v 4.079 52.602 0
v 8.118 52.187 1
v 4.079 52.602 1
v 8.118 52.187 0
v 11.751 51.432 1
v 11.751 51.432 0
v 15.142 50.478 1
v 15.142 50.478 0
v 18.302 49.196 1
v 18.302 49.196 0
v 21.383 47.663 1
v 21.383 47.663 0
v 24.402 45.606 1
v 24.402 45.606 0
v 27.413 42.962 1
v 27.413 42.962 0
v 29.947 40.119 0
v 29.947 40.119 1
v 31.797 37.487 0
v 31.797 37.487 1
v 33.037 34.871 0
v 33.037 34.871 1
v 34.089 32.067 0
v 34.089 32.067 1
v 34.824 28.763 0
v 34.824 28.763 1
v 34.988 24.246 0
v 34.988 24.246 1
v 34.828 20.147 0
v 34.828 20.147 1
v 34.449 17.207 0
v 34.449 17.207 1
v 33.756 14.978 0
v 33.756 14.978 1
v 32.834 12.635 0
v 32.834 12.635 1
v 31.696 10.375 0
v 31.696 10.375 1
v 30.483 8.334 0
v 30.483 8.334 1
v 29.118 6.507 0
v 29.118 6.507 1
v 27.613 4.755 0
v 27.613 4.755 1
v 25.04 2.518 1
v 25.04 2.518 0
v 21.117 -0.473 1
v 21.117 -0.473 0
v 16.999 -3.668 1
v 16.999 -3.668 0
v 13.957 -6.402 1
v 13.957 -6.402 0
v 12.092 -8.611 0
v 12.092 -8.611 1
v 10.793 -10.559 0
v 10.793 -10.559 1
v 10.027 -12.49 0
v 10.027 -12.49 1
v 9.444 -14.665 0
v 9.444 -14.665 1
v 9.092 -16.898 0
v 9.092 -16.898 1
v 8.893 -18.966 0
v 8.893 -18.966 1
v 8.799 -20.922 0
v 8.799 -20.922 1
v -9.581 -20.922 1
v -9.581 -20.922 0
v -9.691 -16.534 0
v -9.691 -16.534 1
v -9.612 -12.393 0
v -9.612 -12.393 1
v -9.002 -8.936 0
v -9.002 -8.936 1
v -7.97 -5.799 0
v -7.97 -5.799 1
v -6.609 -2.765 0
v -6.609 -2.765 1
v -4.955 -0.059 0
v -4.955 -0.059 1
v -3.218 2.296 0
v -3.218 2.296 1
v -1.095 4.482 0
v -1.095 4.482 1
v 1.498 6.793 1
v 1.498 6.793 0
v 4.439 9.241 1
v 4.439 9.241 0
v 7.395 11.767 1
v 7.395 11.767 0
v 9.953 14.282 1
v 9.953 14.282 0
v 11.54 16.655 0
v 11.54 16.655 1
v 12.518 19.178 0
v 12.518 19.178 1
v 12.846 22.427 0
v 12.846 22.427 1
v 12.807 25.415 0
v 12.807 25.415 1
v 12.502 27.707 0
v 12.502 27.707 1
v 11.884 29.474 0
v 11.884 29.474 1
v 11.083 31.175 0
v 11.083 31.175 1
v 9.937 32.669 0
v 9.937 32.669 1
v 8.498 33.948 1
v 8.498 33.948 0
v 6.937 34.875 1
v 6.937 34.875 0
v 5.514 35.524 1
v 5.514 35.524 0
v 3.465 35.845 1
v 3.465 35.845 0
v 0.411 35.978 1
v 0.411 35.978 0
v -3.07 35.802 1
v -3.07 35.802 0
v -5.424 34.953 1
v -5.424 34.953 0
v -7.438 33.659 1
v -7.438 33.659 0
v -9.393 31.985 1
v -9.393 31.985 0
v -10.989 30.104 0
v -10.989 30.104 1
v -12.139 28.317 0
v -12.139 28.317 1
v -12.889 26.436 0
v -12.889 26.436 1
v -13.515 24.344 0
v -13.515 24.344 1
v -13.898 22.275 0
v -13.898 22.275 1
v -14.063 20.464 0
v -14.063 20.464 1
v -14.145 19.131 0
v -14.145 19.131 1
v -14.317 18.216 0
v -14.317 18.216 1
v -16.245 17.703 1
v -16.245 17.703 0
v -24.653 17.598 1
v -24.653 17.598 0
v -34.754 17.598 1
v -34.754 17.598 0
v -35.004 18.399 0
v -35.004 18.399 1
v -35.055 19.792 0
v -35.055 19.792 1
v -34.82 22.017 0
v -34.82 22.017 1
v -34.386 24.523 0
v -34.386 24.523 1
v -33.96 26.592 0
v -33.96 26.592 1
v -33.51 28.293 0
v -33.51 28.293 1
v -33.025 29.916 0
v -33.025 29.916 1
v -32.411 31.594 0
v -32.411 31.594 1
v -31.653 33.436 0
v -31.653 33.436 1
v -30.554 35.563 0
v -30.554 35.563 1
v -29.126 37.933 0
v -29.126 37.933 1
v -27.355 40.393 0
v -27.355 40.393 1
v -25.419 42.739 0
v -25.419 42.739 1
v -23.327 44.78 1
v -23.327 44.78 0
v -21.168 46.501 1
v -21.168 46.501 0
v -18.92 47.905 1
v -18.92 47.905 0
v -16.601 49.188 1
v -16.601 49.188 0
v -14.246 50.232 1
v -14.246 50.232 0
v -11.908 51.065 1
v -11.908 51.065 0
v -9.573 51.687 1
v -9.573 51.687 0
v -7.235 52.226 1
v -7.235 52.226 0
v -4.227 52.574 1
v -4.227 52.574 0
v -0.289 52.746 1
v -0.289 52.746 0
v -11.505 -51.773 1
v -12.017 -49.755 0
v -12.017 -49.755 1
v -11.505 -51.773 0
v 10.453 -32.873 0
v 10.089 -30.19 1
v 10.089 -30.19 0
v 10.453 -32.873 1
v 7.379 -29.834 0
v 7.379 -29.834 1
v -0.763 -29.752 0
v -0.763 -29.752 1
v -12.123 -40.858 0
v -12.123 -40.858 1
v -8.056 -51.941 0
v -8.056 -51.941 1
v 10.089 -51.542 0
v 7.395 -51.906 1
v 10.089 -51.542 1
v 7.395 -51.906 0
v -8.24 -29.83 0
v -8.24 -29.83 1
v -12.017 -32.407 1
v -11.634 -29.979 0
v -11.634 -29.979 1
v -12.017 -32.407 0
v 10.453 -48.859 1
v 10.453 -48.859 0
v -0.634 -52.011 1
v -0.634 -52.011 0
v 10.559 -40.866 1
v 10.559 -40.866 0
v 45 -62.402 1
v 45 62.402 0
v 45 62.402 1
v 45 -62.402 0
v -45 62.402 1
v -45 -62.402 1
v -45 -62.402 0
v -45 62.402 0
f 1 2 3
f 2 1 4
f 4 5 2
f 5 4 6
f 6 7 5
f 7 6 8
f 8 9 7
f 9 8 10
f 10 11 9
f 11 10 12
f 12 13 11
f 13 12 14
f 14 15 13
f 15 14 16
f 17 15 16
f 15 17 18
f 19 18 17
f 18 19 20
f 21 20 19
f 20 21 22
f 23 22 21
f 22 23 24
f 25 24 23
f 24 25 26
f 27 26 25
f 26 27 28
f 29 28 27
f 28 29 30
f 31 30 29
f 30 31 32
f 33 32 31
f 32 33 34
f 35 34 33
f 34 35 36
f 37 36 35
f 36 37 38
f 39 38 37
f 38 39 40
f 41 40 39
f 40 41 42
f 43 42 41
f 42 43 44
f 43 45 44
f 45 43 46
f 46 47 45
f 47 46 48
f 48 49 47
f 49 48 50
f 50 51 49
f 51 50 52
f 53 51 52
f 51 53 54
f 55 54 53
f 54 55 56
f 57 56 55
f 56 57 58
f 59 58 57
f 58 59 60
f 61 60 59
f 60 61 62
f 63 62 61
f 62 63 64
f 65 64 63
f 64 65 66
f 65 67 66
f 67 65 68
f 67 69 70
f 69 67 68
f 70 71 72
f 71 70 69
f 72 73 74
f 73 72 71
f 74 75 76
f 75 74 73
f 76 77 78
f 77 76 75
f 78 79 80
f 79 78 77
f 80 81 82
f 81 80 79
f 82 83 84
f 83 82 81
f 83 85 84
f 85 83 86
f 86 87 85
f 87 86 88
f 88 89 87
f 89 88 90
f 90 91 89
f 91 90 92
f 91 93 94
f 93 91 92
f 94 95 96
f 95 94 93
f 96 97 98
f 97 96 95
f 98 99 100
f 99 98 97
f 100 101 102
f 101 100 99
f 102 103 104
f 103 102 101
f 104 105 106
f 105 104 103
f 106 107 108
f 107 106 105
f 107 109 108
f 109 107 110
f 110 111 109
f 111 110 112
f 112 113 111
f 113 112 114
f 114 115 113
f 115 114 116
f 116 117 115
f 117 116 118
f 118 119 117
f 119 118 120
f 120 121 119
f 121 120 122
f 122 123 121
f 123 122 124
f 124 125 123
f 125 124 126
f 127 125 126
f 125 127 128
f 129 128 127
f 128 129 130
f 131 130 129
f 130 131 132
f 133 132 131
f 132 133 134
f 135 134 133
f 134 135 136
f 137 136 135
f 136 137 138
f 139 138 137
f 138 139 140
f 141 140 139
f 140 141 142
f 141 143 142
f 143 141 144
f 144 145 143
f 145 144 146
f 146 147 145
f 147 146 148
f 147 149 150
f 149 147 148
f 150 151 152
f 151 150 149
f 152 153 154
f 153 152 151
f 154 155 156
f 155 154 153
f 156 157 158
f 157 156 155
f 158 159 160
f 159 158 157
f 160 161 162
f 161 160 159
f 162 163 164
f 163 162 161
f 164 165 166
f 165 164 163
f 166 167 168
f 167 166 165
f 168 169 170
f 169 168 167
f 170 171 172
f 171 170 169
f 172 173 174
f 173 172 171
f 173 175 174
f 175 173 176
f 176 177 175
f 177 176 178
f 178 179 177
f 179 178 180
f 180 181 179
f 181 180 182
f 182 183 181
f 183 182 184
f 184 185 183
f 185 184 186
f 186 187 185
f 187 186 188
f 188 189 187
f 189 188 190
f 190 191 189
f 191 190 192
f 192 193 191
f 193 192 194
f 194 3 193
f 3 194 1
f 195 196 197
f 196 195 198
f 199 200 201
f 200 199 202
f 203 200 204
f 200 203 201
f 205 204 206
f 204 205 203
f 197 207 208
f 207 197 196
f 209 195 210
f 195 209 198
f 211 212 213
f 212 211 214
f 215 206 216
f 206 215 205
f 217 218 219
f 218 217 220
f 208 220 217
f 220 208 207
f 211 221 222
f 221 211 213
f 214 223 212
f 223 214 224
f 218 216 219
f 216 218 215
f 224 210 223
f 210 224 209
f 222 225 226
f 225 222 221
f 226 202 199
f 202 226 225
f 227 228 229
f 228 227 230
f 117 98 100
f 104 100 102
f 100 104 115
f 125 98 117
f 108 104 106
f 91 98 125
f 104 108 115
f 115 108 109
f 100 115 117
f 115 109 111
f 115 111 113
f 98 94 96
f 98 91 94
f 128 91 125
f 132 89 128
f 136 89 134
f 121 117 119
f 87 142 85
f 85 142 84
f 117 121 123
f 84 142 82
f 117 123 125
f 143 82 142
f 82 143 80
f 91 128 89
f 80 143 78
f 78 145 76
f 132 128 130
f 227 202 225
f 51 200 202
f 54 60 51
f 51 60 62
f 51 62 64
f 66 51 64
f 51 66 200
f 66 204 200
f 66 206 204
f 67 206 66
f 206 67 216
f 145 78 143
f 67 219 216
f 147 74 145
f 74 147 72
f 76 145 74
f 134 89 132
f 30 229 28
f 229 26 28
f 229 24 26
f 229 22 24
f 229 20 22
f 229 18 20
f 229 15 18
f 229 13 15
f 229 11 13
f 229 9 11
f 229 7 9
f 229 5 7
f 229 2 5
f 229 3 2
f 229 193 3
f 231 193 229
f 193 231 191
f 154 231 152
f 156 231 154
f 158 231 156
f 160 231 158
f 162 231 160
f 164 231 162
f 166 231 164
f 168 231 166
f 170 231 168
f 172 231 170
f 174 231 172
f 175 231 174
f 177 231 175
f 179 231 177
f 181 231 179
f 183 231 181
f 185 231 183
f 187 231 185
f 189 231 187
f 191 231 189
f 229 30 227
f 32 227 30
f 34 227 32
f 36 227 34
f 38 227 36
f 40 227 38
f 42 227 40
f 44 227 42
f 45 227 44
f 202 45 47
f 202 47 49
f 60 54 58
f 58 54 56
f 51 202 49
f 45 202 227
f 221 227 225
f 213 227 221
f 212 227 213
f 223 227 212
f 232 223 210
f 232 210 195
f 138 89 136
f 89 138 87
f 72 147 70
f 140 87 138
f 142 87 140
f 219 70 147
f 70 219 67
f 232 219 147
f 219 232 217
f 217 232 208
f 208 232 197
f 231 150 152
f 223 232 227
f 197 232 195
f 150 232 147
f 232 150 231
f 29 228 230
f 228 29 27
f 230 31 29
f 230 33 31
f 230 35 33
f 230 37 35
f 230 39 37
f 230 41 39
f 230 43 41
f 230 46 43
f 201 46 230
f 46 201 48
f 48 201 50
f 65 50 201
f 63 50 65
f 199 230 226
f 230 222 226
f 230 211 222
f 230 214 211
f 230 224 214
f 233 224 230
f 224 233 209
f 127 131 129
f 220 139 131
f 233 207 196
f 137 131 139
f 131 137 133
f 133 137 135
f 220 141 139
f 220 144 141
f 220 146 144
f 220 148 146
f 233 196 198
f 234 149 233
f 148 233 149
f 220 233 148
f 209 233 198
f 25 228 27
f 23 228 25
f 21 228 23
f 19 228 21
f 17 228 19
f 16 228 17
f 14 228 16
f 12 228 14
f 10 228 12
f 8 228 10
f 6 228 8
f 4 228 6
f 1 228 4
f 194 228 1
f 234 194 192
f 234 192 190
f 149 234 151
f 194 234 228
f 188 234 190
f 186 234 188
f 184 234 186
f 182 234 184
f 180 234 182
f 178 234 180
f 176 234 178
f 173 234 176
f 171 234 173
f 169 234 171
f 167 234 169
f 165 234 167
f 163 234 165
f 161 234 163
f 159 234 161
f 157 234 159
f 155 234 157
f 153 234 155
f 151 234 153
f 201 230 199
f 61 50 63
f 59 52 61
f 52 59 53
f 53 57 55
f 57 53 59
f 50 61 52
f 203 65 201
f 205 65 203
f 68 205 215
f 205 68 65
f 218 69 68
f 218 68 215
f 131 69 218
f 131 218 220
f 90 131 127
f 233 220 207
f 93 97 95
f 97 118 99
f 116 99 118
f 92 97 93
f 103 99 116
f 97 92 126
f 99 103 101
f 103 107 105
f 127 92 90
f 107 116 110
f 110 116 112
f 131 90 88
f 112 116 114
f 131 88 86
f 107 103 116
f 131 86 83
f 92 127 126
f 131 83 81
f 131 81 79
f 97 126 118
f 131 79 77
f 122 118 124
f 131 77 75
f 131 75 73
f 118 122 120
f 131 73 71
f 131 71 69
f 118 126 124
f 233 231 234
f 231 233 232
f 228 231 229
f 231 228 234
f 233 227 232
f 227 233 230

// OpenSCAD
//------------------------------------------------------------
//	Stencil-o-Matic
//
//	input comes from:
//	http://chaaawa.com/stencil_factory/
//   or
//   http://chaaawa.com/stencil_factory_js/
//
//	http://thingiverse.com/Benjamin
//	http://www.thingiverse.com/thing:55821
//------------------------------------------------------------

// preview[view:south, tilt:top]

// paste here after "Convert&Copy"
input = "no_input";

stencil_thickness = 1;
stencil_width = 90;
margin = 10;

// If you don't want to center
offX = 0;
offY = 0;

handle = "no"; //[no, yes]
handle_orientation = 45;
handle_x = -28;
handle_y = 42;
handle_length = 25;
handle_width = 2;
handle_height = 10;

module void() {}

dispo_width = stencil_width - 2*margin;

points_array = (input=="no_input"?  [[179,268],[[199.26,15.12],[189.19,15.56],[181.5,16.45],[175.52,17.83],[169.55,19.42],[163.57,21.55],[157.55,24.22],[151.62,27.5],[145.87,31.09],[140.35,35.49],[135,40.71],[130.05,46.71],[125.52,53],[121.87,59.06],[119.06,64.5],[117.12,69.21],[115.55,73.5],[114.31,77.65],[113.16,82],[112.07,87.29],[110.96,93.7],[110.36,99.39],[110.49,102.95],[111.13,105],[136.96,105],[158.46,104.73],[163.39,103.42],[163.83,101.08],[164.04,97.67],[164.46,93.04],[165.44,87.75],[167.04,82.4],[168.96,77.59],[171.9,73.02],[175.98,68.21],[180.98,63.93],[186.13,60.62],[192.15,58.45],[201.05,58],[208.86,58.34],[214.1,59.16],[217.74,60.82],[221.73,63.19],[225.41,66.46],[228.34,70.28],[230.39,74.63],[231.97,79.15],[232.75,85.01],[232.85,92.65],[232.01,100.96],[229.51,107.41],[225.45,113.48],[218.91,119.91],[211.35,126.37],[203.83,132.63],[197.2,138.54],[191.77,144.13],[187.33,150.15],[183.1,157.07],[179.62,164.83],[176.98,172.85],[175.42,181.69],[175.22,192.28],[175.5,203.5],[199,203.5],[222.5,203.5],[222.74,198.5],[223.25,193.21],[224.15,187.5],[225.64,181.94],[227.6,177],[230.92,172.02],[235.69,166.37],[243.47,159.38],[254,151.21],[264.03,143.56],[270.61,137.84],[274.46,133.36],[277.95,128.69],[281.05,123.47],[283.96,117.69],[286.32,111.7],[288.09,106],[289.06,98.48],[289.47,88],[289.05,76.45],[287.17,68],[284.48,60.83],[281.31,54.14],[276.58,47.41],[270.1,40.14],[262.4,33.38],[254.68,28.12],[246.8,24.2],[238.72,20.92],[230.05,18.48],[220.76,16.55],[210.43,15.49],[199.26,15.12]],[[198.05,226.08],[178.93,226.28],[170.25,226.66],[169.27,232.87],[169,254.48],[169.27,277.23],[170.58,282.39],[179.4,282.82],[198.38,283],[218.91,282.73],[225.8,281.8],[226.73,274.94],[227,254.5],[226.73,234.06],[225.8,227.2],[218.87,226.29],[198.05,226.08]]]: input);

input_width = points_array[0][0];
input_height= points_array[0][1];
tVersion = points_array[0][2] == undef ? 0: points_array[0][2];
sTrace = dispo_width/input_width;
stencil_height = input_height*sTrace + 2*margin;

//-------------------------------------------------------------------------------
if (tVersion == 0) {
	difference() {
		translate([0, 0, stencil_thickness/2])
		cube([stencil_width, stencil_height, stencil_thickness], center=true);
	
		translate([offX, offY, -stencil_thickness/2])
		scale([sTrace, -sTrace, 1])
		translate([-400/2, -300/2, 0])
		union() {
			for (i = [1:len(points_array) -1] ) {
				linear_extrude(height=stencil_thickness*2) {polygon(points_array[i]);}
			}
		}
	}
}
//-------------------------------------------------------------------------------
if (tVersion == 1) {
	difference() {
		translate([0, 0, stencil_thickness/2])
		cube([stencil_width, stencil_height, stencil_thickness], center=true);

		translate([offX, offY, -stencil_thickness/2])
		scale([sTrace, -sTrace, 1])
		translate([-input_width/2, -input_height/2, 0]) 
		union() {
			for (i = [1:len(points_array) -1] ) {
				if (points_array[i][0] == 1) {
					linear_extrude(height=stencil_thickness*2) {polygon(points_array[i][1]);}
				}
			}
		}
	} 
} 
//-------------------------------------------------------------------------------
if (handle == "yes") {
	translate ([handle_x, handle_y,  handle_height/2])
	rotate([0, 0, handle_orientation])
	cube([handle_length, handle_width, handle_height], center=true);
}
